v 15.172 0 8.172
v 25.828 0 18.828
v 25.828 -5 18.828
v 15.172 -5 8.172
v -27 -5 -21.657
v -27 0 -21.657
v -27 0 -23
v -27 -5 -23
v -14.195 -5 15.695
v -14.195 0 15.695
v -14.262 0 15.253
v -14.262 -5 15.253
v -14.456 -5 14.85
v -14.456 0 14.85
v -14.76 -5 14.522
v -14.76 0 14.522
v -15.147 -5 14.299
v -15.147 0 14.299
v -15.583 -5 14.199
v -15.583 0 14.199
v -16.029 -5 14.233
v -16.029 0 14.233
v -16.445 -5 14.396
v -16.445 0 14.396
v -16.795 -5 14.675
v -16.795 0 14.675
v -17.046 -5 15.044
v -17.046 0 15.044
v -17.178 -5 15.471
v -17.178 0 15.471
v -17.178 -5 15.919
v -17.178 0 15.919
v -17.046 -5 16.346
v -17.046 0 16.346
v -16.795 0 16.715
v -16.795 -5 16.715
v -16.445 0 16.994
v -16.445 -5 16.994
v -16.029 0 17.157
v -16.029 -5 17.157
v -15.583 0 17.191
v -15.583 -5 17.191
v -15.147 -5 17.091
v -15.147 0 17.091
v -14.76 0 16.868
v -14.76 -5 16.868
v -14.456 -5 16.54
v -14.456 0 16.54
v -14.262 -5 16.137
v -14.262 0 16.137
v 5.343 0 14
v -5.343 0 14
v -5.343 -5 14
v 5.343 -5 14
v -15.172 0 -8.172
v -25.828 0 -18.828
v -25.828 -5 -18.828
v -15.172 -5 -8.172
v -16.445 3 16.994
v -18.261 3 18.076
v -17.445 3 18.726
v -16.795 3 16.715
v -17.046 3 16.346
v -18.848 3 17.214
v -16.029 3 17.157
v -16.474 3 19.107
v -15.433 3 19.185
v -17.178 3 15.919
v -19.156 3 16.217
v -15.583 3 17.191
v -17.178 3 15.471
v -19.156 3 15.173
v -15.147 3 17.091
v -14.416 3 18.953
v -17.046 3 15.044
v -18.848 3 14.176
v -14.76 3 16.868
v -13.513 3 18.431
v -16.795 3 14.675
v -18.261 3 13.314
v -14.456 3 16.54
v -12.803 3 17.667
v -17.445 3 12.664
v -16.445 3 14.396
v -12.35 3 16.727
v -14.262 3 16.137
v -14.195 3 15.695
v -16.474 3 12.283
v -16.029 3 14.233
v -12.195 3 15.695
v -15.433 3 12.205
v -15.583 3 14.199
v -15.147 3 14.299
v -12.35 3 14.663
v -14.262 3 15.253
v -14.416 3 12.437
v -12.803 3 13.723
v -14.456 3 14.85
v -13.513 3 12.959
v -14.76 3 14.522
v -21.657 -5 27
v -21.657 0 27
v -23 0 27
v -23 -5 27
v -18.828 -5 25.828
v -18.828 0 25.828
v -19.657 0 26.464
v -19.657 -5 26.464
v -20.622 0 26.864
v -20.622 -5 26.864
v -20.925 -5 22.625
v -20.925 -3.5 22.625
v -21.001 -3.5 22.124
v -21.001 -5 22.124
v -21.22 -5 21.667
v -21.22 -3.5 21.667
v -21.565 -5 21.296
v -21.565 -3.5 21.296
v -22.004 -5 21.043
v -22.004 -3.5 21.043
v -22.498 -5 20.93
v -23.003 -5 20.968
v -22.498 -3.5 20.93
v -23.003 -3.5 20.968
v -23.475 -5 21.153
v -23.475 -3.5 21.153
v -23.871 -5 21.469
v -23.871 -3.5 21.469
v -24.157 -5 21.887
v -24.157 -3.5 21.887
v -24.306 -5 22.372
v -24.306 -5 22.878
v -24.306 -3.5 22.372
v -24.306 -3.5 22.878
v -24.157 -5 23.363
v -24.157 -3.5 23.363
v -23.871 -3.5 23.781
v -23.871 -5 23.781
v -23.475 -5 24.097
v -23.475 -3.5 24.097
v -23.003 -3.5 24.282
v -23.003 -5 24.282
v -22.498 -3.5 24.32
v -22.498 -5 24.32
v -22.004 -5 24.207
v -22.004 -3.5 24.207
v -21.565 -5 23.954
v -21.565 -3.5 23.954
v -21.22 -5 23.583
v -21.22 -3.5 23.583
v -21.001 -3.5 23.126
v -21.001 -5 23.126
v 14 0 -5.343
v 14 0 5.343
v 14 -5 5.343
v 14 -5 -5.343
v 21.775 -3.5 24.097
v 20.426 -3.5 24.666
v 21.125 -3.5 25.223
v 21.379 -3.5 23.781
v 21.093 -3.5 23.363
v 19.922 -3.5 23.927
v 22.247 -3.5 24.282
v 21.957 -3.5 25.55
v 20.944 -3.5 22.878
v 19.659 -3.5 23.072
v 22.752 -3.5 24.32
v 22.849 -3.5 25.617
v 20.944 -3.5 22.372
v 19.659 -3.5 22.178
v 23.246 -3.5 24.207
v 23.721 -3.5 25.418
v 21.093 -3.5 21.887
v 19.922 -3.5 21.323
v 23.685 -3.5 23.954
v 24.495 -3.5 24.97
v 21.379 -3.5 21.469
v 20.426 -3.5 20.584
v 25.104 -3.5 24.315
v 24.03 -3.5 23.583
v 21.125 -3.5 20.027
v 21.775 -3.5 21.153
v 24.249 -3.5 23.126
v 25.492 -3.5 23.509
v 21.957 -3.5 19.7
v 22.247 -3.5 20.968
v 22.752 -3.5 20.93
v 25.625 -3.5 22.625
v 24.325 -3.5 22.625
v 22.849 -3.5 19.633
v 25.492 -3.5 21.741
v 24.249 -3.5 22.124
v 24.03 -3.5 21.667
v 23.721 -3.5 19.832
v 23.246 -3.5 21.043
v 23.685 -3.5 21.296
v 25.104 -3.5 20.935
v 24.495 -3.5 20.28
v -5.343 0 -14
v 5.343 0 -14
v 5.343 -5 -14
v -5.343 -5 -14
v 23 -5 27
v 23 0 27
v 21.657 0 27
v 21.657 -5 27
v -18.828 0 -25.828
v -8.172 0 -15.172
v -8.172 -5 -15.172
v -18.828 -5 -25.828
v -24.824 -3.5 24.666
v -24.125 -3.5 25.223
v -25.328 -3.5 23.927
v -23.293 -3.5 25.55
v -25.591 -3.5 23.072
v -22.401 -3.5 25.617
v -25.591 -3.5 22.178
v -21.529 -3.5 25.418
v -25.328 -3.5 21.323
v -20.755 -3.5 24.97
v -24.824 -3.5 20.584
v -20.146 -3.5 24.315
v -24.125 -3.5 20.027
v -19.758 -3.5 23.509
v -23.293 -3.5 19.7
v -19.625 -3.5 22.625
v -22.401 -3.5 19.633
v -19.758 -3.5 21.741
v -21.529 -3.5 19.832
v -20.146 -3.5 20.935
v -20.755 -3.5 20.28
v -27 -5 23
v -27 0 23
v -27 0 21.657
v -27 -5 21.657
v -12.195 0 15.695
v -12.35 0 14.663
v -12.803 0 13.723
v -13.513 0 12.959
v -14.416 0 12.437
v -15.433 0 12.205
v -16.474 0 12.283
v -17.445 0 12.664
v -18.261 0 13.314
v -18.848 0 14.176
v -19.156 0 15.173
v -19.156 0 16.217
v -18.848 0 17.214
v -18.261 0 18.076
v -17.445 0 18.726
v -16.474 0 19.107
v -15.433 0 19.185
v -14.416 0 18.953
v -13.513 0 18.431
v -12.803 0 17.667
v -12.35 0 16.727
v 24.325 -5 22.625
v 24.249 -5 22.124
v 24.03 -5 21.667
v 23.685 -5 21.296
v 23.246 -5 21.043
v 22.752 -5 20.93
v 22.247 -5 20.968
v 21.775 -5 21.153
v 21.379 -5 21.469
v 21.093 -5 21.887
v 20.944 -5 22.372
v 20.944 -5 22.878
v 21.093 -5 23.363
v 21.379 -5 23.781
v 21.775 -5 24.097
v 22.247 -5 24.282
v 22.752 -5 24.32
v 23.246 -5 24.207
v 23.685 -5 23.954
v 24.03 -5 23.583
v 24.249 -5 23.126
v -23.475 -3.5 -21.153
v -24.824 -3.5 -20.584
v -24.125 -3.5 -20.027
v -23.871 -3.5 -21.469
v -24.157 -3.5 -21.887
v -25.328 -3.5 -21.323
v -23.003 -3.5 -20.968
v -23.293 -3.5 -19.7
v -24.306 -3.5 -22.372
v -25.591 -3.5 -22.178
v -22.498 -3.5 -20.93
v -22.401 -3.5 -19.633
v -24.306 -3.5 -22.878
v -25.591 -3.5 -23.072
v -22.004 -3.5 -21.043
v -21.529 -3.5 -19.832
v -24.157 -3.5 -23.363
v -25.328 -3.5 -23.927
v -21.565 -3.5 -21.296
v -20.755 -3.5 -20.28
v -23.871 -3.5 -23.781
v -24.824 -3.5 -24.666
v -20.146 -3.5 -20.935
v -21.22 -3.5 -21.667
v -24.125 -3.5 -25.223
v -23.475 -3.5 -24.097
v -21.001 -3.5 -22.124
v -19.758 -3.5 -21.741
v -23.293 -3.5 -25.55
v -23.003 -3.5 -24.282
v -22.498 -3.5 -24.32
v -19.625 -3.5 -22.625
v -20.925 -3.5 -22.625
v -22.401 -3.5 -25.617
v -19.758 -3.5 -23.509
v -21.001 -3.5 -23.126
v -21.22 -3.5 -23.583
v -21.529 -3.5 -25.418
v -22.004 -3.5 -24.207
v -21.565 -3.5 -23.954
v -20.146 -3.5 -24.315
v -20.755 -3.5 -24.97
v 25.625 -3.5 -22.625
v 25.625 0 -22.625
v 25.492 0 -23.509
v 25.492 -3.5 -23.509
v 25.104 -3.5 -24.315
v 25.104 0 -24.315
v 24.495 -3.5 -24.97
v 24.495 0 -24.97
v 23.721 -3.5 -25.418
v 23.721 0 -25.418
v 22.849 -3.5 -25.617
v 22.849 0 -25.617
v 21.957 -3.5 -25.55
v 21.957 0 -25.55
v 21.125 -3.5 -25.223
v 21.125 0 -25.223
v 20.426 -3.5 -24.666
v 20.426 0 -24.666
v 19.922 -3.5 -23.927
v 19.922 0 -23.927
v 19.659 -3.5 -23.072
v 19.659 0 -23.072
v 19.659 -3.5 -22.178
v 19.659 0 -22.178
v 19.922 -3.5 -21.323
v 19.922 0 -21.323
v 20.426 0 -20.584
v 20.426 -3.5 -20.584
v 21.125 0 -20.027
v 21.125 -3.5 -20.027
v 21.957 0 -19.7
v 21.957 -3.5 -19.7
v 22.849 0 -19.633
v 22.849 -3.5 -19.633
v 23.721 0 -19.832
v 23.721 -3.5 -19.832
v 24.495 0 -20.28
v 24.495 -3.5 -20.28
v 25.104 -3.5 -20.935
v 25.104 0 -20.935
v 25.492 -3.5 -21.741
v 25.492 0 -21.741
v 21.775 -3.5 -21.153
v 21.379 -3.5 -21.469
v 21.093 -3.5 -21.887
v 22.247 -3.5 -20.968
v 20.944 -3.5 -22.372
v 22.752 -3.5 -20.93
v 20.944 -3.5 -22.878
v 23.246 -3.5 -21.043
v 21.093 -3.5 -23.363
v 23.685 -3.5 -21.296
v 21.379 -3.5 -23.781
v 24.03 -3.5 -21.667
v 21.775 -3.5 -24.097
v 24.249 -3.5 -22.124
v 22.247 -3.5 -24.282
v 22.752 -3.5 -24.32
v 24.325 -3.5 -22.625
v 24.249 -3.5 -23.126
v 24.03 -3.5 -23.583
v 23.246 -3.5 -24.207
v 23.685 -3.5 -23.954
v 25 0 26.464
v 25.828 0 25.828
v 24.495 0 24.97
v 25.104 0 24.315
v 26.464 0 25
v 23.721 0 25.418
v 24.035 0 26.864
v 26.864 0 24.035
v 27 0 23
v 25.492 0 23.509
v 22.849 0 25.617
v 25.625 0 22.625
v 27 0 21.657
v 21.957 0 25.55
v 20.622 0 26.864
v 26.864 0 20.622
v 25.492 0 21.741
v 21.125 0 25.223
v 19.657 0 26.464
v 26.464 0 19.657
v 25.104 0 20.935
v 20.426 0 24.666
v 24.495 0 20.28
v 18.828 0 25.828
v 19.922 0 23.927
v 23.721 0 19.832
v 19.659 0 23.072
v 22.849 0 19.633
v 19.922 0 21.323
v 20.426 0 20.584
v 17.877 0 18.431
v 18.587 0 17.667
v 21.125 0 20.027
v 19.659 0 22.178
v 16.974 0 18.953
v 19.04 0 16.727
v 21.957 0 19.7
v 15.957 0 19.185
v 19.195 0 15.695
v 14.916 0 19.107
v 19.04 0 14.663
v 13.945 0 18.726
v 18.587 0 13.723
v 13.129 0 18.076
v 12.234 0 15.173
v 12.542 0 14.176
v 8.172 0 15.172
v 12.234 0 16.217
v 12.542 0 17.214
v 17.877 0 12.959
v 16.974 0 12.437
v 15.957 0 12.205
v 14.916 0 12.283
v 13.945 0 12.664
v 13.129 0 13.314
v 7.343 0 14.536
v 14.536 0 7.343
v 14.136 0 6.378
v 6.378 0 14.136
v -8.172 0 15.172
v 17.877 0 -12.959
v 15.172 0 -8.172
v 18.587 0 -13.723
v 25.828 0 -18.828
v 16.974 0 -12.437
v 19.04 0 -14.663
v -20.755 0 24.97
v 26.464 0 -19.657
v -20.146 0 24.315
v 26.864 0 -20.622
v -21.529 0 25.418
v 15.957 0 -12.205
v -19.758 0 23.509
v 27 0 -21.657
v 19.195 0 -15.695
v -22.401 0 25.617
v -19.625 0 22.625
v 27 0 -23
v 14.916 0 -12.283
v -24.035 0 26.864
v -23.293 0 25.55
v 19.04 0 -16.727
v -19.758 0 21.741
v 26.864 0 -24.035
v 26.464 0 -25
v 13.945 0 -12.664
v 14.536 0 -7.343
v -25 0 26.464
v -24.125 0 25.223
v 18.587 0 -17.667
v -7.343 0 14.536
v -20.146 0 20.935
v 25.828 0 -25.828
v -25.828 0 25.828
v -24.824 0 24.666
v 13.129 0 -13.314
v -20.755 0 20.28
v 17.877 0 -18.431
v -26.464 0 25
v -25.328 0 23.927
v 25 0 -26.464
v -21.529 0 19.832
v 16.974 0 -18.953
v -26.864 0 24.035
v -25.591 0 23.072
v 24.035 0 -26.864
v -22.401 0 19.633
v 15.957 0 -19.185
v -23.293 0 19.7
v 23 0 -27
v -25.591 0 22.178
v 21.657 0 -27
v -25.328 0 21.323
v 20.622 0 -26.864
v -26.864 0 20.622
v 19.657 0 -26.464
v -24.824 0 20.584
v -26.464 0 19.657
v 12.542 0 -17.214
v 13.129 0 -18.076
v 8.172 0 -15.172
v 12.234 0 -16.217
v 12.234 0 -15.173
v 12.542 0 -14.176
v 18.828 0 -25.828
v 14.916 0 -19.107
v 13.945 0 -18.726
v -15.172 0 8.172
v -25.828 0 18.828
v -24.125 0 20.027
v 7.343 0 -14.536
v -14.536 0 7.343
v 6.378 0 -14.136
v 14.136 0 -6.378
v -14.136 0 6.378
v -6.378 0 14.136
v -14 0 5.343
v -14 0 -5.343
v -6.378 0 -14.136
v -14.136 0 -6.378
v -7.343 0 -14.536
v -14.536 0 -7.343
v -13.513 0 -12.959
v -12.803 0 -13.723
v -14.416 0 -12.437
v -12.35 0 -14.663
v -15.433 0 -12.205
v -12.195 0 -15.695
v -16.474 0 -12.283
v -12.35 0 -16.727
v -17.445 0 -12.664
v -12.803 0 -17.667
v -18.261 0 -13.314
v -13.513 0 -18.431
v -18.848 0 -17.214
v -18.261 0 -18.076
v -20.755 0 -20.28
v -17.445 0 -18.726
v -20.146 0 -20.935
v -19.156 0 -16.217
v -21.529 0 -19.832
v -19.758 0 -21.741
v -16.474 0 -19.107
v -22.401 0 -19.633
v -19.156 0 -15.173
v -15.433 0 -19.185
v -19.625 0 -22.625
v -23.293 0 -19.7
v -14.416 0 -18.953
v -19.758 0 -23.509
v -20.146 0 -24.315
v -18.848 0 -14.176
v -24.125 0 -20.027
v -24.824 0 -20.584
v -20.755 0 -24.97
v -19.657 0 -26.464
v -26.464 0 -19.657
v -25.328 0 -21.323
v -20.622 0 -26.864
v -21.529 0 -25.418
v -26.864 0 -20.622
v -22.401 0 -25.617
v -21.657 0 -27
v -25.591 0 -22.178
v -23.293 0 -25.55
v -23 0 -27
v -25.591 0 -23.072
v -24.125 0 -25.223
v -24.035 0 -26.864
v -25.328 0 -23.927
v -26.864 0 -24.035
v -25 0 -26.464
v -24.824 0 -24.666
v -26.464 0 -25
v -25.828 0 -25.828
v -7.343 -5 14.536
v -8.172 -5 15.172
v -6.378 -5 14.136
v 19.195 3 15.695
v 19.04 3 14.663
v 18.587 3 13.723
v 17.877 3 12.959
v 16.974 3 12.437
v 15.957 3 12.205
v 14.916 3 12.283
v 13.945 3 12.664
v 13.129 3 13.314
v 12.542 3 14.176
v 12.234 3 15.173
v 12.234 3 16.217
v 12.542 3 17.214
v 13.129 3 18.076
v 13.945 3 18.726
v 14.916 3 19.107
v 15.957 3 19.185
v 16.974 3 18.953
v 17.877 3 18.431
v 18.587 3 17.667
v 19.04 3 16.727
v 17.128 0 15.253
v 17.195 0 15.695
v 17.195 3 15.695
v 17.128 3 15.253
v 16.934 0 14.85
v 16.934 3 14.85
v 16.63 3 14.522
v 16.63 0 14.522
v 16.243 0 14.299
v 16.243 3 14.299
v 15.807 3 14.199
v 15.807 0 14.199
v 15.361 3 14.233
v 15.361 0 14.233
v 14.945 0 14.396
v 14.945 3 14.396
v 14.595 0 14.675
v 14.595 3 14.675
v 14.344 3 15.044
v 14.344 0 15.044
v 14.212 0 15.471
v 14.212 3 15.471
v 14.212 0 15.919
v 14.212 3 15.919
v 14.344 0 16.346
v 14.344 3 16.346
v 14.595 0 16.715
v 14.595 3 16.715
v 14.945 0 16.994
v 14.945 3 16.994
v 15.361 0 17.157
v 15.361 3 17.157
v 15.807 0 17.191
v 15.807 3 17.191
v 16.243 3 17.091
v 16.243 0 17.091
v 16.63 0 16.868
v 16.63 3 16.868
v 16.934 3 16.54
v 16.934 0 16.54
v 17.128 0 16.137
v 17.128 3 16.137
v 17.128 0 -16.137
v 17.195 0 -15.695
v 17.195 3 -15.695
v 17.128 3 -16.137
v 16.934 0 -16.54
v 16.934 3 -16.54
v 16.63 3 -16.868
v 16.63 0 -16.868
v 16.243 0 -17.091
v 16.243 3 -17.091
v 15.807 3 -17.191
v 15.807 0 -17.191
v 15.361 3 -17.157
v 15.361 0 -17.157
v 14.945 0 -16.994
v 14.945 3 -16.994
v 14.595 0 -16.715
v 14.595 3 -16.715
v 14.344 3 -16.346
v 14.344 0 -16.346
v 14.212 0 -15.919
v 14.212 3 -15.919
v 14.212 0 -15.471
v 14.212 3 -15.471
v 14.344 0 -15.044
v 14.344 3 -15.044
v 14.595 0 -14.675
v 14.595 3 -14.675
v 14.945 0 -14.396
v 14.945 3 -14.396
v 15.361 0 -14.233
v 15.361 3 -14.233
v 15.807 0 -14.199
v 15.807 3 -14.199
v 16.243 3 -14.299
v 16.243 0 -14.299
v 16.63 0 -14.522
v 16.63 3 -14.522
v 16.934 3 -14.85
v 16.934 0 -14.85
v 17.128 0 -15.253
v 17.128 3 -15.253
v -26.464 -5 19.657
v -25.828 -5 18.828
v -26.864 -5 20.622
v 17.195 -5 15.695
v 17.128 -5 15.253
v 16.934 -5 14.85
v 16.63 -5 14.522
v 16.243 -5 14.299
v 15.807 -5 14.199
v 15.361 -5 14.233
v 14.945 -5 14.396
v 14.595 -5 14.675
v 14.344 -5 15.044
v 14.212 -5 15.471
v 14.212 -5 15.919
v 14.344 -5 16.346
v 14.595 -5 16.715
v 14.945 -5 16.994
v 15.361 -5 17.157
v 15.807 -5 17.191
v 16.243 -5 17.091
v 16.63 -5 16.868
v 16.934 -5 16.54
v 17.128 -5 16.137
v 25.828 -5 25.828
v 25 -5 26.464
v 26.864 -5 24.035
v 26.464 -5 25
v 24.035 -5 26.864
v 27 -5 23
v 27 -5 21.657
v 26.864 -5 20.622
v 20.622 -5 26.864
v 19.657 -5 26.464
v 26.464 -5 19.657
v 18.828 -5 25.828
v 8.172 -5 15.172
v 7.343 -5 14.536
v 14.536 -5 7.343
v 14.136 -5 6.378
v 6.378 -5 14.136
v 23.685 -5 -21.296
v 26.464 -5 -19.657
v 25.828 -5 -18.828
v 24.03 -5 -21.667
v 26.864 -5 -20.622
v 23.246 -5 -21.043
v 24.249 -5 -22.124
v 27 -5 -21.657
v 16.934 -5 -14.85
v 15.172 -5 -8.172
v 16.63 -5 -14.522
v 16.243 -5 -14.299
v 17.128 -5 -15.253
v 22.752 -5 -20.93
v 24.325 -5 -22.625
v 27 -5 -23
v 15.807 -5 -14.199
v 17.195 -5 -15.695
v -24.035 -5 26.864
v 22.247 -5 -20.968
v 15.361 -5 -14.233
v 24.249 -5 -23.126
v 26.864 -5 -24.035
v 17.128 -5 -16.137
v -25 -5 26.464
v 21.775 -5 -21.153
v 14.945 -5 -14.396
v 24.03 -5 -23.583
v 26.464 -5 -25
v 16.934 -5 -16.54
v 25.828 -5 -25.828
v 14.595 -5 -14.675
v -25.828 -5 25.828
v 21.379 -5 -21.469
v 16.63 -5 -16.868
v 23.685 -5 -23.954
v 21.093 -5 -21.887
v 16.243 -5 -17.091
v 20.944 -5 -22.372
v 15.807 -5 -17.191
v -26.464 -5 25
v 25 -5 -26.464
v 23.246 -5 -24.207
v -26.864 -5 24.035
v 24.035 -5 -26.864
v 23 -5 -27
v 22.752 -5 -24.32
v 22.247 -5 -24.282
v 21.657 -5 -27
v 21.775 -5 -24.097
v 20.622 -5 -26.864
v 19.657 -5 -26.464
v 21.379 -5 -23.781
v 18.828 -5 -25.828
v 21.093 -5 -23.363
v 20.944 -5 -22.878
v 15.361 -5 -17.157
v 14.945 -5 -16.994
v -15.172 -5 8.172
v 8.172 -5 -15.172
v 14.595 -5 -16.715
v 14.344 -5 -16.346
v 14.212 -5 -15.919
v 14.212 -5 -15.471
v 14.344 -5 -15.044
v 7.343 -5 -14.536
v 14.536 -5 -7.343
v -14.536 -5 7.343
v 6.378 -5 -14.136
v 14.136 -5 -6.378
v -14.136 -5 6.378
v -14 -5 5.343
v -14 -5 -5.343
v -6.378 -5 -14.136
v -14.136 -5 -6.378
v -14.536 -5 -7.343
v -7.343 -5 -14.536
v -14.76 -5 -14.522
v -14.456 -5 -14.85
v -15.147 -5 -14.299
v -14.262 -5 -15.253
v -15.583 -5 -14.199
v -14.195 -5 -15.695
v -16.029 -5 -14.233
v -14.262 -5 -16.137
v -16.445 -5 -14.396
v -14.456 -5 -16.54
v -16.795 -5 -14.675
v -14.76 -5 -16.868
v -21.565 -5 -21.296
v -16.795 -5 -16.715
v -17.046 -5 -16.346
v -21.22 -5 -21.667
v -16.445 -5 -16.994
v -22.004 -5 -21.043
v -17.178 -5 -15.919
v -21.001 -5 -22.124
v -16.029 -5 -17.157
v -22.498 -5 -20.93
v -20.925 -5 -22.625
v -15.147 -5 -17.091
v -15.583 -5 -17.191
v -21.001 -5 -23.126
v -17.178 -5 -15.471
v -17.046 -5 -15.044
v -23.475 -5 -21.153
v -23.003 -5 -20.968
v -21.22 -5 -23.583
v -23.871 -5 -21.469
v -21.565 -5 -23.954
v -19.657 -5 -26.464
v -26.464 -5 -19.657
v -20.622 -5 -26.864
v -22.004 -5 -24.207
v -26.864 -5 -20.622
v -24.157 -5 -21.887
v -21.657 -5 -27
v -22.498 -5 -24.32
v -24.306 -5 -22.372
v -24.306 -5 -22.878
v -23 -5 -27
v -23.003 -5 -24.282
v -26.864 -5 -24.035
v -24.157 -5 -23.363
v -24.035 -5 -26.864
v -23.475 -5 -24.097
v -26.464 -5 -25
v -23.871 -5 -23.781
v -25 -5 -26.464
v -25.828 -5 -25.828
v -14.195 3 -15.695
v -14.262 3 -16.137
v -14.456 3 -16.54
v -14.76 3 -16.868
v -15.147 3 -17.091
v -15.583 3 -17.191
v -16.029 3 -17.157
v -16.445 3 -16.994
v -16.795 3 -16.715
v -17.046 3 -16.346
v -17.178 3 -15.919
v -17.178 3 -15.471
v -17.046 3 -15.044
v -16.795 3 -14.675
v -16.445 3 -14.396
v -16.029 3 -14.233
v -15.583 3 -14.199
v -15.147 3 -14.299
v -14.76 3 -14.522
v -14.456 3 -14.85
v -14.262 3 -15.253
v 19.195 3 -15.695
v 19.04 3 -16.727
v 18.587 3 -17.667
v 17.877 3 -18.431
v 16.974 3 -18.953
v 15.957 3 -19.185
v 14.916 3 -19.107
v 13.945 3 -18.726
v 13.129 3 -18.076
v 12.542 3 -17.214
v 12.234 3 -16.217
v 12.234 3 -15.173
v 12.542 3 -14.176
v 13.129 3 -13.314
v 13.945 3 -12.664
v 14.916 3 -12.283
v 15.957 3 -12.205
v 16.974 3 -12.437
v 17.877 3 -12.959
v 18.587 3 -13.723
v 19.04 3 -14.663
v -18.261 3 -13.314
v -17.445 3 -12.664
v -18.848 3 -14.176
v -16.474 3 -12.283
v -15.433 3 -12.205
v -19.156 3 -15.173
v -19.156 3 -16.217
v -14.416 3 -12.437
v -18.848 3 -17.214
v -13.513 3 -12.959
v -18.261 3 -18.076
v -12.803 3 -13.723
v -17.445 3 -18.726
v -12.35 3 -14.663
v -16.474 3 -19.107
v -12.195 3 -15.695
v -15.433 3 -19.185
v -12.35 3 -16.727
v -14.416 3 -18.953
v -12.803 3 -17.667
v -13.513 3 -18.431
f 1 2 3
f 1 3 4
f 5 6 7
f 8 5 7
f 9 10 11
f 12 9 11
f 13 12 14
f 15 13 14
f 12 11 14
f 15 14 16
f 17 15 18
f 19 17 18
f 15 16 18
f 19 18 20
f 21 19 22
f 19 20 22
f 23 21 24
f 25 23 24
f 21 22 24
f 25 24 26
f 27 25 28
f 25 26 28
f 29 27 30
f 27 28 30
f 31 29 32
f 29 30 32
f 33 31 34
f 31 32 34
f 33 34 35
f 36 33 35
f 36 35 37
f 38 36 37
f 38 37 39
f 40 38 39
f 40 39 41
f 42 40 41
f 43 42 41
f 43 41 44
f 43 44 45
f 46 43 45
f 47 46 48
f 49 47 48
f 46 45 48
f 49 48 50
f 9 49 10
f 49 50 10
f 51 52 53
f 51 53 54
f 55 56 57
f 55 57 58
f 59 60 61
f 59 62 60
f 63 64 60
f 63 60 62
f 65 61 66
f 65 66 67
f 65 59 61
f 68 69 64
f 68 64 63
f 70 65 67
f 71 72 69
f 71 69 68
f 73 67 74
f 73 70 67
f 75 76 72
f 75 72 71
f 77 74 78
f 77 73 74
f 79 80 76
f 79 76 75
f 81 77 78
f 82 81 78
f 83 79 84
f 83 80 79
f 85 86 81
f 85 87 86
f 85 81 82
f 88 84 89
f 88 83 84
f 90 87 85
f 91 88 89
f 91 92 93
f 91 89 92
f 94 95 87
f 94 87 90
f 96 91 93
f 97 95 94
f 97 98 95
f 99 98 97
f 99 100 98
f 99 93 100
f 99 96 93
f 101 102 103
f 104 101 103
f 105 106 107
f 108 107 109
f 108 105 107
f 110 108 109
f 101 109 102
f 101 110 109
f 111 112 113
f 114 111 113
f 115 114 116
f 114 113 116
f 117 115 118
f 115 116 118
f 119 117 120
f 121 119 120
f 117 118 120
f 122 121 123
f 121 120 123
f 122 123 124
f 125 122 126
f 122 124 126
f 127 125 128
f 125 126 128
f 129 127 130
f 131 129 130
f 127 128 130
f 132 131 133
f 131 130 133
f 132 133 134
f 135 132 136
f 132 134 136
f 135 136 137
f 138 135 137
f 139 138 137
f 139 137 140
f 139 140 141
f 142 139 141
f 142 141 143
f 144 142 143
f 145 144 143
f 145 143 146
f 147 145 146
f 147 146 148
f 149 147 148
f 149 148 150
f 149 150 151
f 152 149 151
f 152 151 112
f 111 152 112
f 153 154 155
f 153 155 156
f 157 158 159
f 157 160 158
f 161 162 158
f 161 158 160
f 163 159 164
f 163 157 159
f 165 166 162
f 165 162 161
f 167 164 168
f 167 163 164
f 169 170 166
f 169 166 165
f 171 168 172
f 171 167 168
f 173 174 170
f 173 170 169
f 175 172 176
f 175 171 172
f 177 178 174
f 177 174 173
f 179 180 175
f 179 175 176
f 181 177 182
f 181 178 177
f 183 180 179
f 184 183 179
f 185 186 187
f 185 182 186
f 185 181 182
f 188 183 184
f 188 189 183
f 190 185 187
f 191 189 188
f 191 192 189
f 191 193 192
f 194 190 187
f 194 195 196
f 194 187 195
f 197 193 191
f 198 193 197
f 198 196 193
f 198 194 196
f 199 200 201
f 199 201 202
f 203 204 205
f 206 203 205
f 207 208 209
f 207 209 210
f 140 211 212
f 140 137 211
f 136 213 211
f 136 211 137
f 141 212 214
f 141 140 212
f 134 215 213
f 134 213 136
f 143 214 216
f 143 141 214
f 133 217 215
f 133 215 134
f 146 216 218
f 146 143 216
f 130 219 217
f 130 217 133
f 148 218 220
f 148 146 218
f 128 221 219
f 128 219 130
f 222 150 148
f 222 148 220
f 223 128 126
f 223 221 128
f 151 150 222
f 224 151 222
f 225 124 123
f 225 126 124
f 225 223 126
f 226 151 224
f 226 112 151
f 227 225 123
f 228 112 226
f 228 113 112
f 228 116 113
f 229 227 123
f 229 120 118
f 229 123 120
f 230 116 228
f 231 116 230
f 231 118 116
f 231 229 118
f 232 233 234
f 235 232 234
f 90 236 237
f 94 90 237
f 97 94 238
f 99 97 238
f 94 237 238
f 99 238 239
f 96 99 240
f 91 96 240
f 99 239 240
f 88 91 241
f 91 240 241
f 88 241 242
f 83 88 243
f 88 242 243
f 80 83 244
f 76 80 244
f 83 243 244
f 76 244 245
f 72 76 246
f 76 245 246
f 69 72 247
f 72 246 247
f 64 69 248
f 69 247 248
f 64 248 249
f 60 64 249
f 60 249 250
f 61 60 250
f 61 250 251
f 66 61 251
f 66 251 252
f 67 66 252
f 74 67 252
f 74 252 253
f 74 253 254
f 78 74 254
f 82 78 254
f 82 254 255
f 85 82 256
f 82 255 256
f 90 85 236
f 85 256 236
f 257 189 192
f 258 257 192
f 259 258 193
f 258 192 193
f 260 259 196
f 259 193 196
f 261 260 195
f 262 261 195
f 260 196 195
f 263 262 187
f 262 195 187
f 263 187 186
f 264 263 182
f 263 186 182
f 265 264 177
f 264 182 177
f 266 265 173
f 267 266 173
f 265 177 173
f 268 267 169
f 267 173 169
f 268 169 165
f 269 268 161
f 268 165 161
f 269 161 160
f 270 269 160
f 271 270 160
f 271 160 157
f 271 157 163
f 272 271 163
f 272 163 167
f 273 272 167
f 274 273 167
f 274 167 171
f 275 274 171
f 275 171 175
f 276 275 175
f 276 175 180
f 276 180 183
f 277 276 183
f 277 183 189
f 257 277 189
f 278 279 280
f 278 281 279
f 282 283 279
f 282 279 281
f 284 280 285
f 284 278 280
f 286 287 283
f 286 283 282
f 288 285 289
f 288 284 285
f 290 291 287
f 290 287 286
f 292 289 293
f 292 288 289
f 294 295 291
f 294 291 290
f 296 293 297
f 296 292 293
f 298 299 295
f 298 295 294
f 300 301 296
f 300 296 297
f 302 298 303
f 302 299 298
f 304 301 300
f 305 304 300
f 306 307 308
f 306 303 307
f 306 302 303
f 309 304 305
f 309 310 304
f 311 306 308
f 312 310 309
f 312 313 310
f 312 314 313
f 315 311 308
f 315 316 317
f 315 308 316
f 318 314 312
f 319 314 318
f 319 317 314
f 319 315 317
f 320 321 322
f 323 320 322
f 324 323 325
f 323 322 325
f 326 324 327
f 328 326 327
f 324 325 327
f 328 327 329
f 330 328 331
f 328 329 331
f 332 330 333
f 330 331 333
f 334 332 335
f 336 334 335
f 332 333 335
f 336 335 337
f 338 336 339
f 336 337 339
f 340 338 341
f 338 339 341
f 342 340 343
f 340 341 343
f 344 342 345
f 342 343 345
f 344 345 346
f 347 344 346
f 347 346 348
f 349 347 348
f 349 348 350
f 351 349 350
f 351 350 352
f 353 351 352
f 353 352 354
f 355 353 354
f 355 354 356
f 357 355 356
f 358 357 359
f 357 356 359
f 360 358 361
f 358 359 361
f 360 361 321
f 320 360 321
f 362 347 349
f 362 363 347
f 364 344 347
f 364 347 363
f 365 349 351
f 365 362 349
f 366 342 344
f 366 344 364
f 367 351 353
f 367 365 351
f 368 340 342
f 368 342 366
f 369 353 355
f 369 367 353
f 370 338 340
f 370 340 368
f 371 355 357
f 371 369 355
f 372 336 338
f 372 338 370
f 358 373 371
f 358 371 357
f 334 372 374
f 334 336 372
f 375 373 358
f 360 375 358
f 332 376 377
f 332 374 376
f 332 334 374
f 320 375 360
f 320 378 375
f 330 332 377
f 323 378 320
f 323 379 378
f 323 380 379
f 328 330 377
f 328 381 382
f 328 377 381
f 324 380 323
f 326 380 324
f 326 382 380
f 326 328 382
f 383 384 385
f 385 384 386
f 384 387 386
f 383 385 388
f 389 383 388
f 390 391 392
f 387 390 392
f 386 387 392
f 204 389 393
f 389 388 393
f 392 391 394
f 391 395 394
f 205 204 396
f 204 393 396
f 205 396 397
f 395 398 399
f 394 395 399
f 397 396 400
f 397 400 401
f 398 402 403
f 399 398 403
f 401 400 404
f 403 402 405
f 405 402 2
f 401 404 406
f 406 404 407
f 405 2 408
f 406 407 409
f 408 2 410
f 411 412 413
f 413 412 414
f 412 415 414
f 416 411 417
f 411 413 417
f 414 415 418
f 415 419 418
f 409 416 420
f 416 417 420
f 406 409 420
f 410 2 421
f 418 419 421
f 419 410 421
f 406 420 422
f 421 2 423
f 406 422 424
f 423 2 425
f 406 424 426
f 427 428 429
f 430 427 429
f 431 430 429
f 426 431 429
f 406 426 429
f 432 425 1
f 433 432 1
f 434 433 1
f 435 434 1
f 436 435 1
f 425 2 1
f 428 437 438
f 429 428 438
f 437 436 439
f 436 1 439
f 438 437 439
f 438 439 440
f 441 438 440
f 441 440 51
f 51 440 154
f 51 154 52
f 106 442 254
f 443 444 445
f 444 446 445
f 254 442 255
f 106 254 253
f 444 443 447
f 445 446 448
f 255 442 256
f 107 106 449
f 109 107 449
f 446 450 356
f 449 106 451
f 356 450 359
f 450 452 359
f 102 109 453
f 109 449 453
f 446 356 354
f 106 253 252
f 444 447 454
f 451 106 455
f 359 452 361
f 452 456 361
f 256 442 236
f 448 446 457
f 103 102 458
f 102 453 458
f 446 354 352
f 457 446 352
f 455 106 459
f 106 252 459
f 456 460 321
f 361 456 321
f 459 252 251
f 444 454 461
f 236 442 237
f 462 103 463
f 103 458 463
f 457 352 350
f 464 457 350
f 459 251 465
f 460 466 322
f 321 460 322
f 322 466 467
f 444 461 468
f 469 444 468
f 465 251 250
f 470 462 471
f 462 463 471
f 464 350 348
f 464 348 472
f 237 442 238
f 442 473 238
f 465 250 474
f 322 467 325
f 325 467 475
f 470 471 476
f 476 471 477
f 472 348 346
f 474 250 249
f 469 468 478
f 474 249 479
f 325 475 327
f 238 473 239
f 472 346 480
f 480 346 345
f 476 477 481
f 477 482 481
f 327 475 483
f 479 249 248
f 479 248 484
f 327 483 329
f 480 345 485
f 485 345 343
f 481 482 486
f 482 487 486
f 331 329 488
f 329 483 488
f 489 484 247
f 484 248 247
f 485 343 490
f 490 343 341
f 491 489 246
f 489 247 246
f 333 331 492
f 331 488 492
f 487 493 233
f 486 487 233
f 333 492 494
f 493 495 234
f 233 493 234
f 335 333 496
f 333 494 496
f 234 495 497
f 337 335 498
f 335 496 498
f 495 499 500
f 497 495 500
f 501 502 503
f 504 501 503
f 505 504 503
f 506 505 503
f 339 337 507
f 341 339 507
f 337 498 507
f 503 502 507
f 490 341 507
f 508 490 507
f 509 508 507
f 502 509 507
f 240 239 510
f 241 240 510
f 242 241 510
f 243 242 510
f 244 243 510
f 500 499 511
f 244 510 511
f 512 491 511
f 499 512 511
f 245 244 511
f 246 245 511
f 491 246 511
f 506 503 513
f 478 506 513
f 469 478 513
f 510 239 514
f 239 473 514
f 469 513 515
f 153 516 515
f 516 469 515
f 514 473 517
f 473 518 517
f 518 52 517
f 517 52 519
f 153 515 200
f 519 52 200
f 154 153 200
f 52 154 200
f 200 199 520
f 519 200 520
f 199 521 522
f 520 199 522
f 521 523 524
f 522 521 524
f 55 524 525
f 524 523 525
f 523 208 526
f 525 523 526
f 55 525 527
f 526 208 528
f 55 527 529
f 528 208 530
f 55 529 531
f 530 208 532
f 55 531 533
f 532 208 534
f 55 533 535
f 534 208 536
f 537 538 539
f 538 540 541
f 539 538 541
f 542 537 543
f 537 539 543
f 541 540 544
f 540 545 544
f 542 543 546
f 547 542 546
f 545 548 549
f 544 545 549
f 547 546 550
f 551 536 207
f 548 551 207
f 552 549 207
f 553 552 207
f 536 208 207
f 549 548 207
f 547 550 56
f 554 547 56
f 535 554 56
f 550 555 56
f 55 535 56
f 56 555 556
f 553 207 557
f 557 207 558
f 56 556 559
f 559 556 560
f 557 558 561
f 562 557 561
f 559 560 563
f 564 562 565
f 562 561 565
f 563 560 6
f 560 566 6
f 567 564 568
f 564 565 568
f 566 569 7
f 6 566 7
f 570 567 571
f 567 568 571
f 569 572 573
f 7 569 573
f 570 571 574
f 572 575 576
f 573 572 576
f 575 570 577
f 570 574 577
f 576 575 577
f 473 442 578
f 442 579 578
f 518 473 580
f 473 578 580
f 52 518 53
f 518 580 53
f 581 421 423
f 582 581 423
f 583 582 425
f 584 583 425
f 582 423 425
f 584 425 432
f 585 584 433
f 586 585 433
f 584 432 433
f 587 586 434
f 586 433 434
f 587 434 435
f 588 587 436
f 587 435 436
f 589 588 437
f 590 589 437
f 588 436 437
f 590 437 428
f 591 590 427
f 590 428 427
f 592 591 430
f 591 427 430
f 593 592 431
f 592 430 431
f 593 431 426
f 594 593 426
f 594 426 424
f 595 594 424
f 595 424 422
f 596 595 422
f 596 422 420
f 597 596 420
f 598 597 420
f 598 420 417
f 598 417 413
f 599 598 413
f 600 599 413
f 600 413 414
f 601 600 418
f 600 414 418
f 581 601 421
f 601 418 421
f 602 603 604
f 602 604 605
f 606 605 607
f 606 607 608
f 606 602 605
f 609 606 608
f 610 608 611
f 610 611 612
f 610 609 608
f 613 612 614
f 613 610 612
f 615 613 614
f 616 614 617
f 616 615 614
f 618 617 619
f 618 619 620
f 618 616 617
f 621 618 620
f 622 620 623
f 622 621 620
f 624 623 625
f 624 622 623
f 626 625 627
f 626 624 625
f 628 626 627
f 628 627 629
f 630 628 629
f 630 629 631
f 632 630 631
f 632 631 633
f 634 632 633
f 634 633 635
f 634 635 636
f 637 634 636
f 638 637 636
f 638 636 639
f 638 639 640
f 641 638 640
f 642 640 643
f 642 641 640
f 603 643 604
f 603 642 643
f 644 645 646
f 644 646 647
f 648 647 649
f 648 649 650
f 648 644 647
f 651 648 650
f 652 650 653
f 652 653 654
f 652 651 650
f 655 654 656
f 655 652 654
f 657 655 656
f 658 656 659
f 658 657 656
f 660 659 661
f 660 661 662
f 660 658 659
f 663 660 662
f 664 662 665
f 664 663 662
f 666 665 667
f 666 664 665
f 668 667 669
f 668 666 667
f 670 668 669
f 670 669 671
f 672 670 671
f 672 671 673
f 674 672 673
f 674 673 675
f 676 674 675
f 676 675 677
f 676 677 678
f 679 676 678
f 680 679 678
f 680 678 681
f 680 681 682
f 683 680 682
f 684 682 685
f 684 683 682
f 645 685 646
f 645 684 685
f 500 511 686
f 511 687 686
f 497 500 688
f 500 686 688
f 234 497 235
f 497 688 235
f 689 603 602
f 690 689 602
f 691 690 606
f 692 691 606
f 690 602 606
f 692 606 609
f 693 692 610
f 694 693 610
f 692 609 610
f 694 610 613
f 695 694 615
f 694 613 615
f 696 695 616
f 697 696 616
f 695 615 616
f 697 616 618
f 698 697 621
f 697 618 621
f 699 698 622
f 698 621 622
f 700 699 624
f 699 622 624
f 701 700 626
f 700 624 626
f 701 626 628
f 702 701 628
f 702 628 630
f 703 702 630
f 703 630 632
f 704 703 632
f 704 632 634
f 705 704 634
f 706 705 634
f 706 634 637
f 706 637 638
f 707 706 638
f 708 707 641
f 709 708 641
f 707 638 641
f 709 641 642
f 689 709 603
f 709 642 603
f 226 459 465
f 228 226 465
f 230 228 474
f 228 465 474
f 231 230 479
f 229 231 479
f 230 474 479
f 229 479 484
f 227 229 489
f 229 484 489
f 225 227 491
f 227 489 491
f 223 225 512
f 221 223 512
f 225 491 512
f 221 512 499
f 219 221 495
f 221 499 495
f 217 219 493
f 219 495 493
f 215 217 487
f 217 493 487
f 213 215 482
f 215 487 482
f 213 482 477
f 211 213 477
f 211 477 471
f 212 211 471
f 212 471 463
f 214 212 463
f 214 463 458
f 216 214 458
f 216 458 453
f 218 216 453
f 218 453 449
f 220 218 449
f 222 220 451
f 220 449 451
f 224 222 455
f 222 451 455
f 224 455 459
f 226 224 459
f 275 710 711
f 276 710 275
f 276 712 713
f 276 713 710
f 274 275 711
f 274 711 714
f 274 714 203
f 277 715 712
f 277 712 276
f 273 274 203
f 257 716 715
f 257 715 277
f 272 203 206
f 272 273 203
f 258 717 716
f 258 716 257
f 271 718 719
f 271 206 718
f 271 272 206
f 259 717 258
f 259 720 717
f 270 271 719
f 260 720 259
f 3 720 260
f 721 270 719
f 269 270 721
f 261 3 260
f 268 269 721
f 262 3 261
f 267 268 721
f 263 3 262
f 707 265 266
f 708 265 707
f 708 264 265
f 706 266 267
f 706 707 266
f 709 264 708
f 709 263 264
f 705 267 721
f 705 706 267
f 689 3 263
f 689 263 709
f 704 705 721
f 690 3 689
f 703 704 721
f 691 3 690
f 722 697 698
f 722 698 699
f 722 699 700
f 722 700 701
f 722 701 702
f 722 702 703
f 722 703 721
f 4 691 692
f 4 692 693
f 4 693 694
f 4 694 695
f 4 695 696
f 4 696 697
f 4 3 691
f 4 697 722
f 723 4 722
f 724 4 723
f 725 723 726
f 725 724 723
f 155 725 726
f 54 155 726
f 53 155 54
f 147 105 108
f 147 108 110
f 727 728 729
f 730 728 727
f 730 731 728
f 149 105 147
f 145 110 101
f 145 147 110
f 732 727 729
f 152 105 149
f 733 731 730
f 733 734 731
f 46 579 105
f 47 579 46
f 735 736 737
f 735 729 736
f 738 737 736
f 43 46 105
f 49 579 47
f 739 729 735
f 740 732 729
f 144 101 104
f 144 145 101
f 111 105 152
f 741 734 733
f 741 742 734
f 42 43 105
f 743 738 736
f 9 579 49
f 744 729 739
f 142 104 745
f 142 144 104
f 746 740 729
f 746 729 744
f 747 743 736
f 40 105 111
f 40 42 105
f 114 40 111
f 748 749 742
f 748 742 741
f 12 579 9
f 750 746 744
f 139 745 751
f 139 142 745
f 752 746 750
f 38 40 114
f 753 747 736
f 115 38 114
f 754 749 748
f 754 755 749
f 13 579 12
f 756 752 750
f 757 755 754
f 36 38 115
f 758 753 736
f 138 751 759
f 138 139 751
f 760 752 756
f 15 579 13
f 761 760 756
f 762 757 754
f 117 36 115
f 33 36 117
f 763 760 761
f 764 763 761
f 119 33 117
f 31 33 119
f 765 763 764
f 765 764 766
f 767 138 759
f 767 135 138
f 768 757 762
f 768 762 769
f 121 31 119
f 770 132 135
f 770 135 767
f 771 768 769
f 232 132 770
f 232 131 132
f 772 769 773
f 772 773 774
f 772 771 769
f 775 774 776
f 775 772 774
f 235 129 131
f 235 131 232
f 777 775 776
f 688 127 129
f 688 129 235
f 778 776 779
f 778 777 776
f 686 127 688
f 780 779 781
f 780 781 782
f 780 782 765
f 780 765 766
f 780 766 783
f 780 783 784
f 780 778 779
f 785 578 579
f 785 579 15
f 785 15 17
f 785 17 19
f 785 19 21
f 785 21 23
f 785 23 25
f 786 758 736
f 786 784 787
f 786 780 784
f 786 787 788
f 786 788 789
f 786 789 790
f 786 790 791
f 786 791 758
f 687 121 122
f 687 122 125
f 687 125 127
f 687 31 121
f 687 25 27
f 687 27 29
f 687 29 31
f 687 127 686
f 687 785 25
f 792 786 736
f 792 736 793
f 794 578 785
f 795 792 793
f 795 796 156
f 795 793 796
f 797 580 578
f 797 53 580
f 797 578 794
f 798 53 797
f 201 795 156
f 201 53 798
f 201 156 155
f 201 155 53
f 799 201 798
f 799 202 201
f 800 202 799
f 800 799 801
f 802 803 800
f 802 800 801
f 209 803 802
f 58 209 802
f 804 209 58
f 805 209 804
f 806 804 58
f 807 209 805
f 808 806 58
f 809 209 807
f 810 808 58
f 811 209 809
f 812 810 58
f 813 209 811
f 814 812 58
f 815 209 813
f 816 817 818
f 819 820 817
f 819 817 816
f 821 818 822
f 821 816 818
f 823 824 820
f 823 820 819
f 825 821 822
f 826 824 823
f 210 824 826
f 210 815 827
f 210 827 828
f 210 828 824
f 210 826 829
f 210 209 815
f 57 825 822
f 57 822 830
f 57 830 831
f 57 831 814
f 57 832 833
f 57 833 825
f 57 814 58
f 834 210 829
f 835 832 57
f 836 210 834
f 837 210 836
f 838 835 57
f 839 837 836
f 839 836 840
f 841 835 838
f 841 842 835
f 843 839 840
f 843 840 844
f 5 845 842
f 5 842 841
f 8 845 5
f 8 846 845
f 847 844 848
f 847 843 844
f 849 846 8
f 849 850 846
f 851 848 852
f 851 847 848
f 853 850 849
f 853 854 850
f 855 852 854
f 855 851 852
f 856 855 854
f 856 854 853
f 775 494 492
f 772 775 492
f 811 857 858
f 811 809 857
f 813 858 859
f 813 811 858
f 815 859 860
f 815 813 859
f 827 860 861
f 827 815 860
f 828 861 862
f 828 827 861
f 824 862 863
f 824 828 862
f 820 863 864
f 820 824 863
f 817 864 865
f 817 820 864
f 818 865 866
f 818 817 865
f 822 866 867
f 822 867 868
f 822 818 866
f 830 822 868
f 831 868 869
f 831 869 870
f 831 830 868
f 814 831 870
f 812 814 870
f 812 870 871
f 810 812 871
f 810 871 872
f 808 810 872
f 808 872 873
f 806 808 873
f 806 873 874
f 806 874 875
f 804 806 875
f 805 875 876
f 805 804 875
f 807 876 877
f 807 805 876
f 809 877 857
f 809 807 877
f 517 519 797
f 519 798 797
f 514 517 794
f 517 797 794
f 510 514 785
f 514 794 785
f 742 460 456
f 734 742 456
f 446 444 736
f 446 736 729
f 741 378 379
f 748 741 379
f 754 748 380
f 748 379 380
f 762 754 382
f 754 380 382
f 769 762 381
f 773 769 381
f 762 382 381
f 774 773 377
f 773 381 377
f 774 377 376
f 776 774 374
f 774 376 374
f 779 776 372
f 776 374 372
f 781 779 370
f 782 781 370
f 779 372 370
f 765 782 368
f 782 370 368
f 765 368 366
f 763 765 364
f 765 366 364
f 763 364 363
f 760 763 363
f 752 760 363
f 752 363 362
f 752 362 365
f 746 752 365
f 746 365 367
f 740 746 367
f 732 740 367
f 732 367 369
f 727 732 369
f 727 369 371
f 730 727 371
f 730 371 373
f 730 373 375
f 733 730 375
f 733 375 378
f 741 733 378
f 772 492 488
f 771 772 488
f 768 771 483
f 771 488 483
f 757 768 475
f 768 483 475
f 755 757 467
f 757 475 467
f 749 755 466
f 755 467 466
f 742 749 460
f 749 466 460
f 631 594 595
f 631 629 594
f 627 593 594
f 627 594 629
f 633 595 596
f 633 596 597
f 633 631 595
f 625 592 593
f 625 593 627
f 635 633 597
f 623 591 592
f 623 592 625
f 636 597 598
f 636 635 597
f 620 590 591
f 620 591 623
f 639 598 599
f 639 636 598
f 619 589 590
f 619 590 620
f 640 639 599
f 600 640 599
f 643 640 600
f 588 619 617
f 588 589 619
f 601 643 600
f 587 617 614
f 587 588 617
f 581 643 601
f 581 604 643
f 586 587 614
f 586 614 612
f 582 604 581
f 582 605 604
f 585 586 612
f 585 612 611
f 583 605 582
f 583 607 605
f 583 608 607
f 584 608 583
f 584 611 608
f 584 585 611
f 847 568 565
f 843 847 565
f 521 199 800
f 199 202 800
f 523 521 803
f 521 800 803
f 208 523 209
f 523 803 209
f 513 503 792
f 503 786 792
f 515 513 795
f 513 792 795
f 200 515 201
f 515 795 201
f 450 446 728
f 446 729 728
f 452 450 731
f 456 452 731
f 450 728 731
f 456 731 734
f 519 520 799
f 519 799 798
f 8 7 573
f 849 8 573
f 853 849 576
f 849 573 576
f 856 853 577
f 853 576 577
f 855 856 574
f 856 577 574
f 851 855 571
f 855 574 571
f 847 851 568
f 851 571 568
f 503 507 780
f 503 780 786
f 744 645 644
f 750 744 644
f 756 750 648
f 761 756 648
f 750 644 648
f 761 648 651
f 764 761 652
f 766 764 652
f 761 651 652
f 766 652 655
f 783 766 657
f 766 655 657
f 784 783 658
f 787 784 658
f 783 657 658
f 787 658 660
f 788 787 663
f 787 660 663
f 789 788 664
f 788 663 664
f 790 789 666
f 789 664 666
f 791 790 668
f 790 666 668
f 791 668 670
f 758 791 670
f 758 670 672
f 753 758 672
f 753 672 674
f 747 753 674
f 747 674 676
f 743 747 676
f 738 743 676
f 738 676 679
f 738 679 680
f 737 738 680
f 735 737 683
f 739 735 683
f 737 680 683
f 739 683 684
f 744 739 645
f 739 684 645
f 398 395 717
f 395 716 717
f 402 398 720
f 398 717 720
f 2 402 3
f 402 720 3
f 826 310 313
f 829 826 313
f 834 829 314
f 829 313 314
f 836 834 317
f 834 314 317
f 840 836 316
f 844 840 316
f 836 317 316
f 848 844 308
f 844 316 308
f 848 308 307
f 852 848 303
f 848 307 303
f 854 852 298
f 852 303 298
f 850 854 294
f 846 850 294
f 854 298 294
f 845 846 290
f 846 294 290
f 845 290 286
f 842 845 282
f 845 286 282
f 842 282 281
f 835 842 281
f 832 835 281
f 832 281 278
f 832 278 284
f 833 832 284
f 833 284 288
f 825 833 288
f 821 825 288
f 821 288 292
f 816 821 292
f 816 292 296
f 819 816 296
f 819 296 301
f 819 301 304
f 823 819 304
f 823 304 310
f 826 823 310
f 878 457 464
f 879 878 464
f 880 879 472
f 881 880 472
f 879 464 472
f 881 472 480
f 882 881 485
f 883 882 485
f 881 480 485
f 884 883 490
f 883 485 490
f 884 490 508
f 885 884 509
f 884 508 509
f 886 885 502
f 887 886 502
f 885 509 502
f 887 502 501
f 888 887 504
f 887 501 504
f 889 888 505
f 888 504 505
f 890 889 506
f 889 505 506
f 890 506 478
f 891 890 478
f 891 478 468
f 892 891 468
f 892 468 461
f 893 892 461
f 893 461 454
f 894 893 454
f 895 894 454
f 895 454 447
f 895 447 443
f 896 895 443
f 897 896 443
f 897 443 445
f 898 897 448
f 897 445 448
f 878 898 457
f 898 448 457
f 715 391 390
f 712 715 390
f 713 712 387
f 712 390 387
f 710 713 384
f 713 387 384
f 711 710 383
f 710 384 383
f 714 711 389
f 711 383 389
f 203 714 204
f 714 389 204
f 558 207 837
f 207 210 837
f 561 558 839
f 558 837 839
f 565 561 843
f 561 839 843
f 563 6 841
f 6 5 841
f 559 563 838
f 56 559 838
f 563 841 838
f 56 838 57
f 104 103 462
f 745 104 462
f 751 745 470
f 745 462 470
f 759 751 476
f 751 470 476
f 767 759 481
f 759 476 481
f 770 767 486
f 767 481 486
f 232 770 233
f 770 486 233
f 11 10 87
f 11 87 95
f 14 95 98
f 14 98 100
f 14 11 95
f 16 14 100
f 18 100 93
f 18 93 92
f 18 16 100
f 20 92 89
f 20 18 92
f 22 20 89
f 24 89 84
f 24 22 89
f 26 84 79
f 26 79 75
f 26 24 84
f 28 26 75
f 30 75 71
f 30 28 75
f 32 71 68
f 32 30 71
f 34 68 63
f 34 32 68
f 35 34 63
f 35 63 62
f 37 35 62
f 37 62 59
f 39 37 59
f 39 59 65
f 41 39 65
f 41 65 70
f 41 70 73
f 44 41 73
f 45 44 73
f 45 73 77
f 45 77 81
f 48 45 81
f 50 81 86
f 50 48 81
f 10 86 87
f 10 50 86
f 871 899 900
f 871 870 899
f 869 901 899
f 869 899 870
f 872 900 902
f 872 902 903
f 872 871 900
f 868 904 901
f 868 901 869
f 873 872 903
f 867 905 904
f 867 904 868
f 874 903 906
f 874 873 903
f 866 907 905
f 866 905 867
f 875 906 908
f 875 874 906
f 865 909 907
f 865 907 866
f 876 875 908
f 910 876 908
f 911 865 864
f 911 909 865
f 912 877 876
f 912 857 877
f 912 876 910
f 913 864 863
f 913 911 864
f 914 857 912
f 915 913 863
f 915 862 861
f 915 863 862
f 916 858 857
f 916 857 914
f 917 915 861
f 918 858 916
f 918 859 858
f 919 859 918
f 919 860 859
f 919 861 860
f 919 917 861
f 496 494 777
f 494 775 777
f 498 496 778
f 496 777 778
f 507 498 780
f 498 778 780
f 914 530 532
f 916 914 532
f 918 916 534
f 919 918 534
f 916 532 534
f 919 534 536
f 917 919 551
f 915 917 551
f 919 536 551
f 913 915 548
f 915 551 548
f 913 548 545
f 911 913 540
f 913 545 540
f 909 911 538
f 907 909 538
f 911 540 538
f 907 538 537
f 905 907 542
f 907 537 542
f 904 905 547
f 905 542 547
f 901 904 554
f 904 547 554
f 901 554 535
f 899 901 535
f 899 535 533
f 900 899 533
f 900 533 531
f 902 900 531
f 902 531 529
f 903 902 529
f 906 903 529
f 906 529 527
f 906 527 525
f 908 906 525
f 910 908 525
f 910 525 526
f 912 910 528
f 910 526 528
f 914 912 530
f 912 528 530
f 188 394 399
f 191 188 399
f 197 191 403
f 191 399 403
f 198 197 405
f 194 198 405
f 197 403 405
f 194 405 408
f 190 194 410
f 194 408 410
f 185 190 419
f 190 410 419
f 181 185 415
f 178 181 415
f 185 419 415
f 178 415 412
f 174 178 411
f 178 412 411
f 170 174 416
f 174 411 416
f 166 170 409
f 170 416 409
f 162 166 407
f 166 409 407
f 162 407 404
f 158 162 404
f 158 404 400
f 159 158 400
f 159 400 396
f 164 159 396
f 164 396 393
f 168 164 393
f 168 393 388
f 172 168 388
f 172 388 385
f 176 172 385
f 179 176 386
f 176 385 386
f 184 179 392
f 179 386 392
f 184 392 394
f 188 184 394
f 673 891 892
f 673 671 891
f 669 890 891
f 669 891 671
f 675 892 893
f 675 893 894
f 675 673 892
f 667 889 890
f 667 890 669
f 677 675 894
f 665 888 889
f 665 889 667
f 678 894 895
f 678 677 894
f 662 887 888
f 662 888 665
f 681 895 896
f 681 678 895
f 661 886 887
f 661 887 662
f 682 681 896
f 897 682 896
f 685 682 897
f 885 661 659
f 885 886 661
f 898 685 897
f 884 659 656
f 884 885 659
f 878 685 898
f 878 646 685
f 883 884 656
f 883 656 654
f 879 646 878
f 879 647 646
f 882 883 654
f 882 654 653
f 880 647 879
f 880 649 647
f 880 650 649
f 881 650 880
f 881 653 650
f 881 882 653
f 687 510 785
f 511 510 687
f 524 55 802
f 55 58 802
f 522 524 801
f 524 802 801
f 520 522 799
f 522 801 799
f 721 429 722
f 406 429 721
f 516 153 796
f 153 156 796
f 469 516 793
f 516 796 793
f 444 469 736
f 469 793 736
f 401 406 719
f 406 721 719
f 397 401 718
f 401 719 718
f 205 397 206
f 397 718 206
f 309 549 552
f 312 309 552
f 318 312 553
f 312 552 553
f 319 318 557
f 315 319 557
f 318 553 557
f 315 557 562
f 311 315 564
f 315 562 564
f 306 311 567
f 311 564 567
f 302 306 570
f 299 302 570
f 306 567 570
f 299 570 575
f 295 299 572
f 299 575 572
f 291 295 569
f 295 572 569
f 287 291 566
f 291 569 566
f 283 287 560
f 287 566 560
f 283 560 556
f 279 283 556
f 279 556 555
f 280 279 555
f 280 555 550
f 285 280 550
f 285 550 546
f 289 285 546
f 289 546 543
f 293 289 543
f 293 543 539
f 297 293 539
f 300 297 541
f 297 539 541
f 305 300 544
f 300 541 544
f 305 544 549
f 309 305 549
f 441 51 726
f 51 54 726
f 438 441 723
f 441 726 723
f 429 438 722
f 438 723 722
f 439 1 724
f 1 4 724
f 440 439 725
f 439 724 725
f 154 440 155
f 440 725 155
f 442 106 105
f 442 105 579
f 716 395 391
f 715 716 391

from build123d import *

# Parameters (mm, degrees)
SZKIC2_R                    = 1.7
SZKIC2_R_2                  = 1.5
DODANIE_WYCI_GNI_CIE1_DEPTH = 5
DODANIE_WYCI_GNI_CIE2_START = 3
SZKIC2_3_R                  = 3.5
SZKIC2_3_R_2                = 1.5
DODANIE_WYCI_GNI_CIE2_DEPTH = 3
WYTNIJ_WYCI_GNI_CIE1_DEPTH  = 39.509739028
SZYK_KO_OWY1_COUNT          = 4
ZAOKR_GLENIE1_R             = 4
SZKIC5_R                    = 3
WYTNIJ_WYCI_GNI_CIE3_DEPTH  = 3.5


with BuildPart() as part:
    # Szkic2 → Dodanie-wyci_gni_cie1 (new body)
    with BuildSketch(Plane(origin=(0, 0, 0), x_dir=(1, 0, 0), z_dir=(0, 1, 0))):
        with BuildLine():
            ThreePointArc((-27, -23), (-25.828427125, -25.828427125), (-23, -27))
            Line((-23, -27), (23, -27))
            ThreePointArc((23, -27), (25.828427125, -25.828427125), (27, -23))
            Line((27, -23), (27, 23))
            ThreePointArc((27, 23), (25.828427125, 25.828427125), (23, 27))
            Line((23, 27), (-23, 27))
            ThreePointArc((-23, 27), (-25.828427125, 25.828427125), (-27, 23))
            Line((-27, 23), (-27, -23))
        make_face()
        with Locations((-22.625, -22.625)):
            Circle(SZKIC2_R, mode=Mode.SUBTRACT)
        with Locations((22.625, -22.625)):
            Circle(SZKIC2_R, mode=Mode.SUBTRACT)
        with Locations((-22.625, 22.625)):
            Circle(SZKIC2_R, mode=Mode.SUBTRACT)
        with Locations((22.625, 22.625)):
            Circle(SZKIC2_R, mode=Mode.SUBTRACT)
        with Locations((-15.695, -15.695)):
            Circle(SZKIC2_R_2, mode=Mode.SUBTRACT)
        with Locations((15.695, -15.695)):
            Circle(SZKIC2_R_2, mode=Mode.SUBTRACT)
        with Locations((-15.695, 15.695)):
            Circle(SZKIC2_R_2, mode=Mode.SUBTRACT)
        with Locations((15.695, 15.695)):
            Circle(SZKIC2_R_2, mode=Mode.SUBTRACT)
    extrude(amount=-DODANIE_WYCI_GNI_CIE1_DEPTH)

    # Szkic2_3 → Dodanie-wyci_gni_cie2 (add)
    # profile 1 of 4: a face of its own
    with BuildSketch(Plane(origin=(0, 0, 0), x_dir=(1, 0, 0), z_dir=(0, 1, 0)).offset(DODANIE_WYCI_GNI_CIE2_START)):
        with Locations((-15.695, 15.695)):
            Circle(SZKIC2_3_R)
        with Locations((-15.695, 15.695)):
            Circle(SZKIC2_3_R_2, mode=Mode.SUBTRACT)
    # profile 2 of 4: a face of its own
    with BuildSketch(Plane(origin=(0, 0, 0), x_dir=(1, 0, 0), z_dir=(0, 1, 0)).offset(DODANIE_WYCI_GNI_CIE2_START)):
        with Locations((15.695, 15.695)):
            Circle(SZKIC2_3_R)
        with Locations((15.695, 15.695)):
            Circle(SZKIC2_3_R_2, mode=Mode.SUBTRACT)
    # profile 3 of 4: a face of its own
    with BuildSketch(Plane(origin=(0, 0, 0), x_dir=(1, 0, 0), z_dir=(0, 1, 0)).offset(DODANIE_WYCI_GNI_CIE2_START)):
        with Locations((-15.695, -15.695)):
            Circle(SZKIC2_3_R)
        with Locations((-15.695, -15.695)):
            Circle(SZKIC2_3_R_2, mode=Mode.SUBTRACT)
    # profile 4 of 4: a face of its own
    with BuildSketch(Plane(origin=(0, 0, 0), x_dir=(1, 0, 0), z_dir=(0, 1, 0)).offset(DODANIE_WYCI_GNI_CIE2_START)):
        with Locations((15.695, -15.695)):
            Circle(SZKIC2_3_R)
        with Locations((15.695, -15.695)):
            Circle(SZKIC2_3_R_2, mode=Mode.SUBTRACT)
    extrude(amount=-DODANIE_WYCI_GNI_CIE2_DEPTH)

    # Szkic3 → Wytnij-wyci_gni_cie1 (cut, through all)
    with BuildSketch(Plane(origin=(0, 0, 0), x_dir=(1, 0, 0), z_dir=(0, 1, 0))):
        Polygon((-7, -14), (7, -14), (20, -27), (-20, -27), align=None)
    wytnij_wyci_gni_cie1 = extrude(amount=-WYTNIJ_WYCI_GNI_CIE1_DEPTH, mode=Mode.SUBTRACT)

    # Szyk ko_owy1: Wytnij-wyci_gni_cie1 ×4 about axis
    szyk_ko_owy1_axis = Axis((0, -8.6, 0), (0, 1, 0))
    for i in range(1, SZYK_KO_OWY1_COUNT):
        add(wytnij_wyci_gni_cie1.rotate(szyk_ko_owy1_axis, i * 360 / SZYK_KO_OWY1_COUNT), mode=Mode.SUBTRACT)

    # Zaokr_glenie1
    zaokr_glenie1_edges = [part.edges().sort_by_distance(p)[0] for p in [
        (20, -2.5, 27),
        (7, -2.5, 14),
        (-20, -2.5, 27),
        (-7, -2.5, 14),
        (27, -2.5, -20),
        (14, -2.5, -7),
        (14, -2.5, 7),
        (27, -2.5, 20),
        (20, -2.5, -27),
        (7, -2.5, -14),
        (-20, -2.5, -27),
        (-7, -2.5, -14),
        (-27, -2.5, 20),
        (-14, -2.5, 7),
        (-14, -2.5, -7),
        (-27, -2.5, -20),
    ]]
    fillet(zaokr_glenie1_edges, radius=ZAOKR_GLENIE1_R)

    # Szkic5 → Wytnij-wyci_gni_cie3 (cut)
    with BuildSketch(Plane(origin=(0, 0, 0), x_dir=(1, 0, 0), z_dir=(0, 1, 0))):
        with Locations((-22.625, -22.625)):
            Circle(SZKIC5_R)
        with Locations((-22.625, 22.625)):
            Circle(SZKIC5_R)
        with Locations((22.625, 22.625)):
            Circle(SZKIC5_R)
        with Locations((22.625, -22.625)):
            Circle(SZKIC5_R)
    extrude(amount=-WYTNIJ_WYCI_GNI_CIE3_DEPTH, mode=Mode.SUBTRACT)


solid = part.part
